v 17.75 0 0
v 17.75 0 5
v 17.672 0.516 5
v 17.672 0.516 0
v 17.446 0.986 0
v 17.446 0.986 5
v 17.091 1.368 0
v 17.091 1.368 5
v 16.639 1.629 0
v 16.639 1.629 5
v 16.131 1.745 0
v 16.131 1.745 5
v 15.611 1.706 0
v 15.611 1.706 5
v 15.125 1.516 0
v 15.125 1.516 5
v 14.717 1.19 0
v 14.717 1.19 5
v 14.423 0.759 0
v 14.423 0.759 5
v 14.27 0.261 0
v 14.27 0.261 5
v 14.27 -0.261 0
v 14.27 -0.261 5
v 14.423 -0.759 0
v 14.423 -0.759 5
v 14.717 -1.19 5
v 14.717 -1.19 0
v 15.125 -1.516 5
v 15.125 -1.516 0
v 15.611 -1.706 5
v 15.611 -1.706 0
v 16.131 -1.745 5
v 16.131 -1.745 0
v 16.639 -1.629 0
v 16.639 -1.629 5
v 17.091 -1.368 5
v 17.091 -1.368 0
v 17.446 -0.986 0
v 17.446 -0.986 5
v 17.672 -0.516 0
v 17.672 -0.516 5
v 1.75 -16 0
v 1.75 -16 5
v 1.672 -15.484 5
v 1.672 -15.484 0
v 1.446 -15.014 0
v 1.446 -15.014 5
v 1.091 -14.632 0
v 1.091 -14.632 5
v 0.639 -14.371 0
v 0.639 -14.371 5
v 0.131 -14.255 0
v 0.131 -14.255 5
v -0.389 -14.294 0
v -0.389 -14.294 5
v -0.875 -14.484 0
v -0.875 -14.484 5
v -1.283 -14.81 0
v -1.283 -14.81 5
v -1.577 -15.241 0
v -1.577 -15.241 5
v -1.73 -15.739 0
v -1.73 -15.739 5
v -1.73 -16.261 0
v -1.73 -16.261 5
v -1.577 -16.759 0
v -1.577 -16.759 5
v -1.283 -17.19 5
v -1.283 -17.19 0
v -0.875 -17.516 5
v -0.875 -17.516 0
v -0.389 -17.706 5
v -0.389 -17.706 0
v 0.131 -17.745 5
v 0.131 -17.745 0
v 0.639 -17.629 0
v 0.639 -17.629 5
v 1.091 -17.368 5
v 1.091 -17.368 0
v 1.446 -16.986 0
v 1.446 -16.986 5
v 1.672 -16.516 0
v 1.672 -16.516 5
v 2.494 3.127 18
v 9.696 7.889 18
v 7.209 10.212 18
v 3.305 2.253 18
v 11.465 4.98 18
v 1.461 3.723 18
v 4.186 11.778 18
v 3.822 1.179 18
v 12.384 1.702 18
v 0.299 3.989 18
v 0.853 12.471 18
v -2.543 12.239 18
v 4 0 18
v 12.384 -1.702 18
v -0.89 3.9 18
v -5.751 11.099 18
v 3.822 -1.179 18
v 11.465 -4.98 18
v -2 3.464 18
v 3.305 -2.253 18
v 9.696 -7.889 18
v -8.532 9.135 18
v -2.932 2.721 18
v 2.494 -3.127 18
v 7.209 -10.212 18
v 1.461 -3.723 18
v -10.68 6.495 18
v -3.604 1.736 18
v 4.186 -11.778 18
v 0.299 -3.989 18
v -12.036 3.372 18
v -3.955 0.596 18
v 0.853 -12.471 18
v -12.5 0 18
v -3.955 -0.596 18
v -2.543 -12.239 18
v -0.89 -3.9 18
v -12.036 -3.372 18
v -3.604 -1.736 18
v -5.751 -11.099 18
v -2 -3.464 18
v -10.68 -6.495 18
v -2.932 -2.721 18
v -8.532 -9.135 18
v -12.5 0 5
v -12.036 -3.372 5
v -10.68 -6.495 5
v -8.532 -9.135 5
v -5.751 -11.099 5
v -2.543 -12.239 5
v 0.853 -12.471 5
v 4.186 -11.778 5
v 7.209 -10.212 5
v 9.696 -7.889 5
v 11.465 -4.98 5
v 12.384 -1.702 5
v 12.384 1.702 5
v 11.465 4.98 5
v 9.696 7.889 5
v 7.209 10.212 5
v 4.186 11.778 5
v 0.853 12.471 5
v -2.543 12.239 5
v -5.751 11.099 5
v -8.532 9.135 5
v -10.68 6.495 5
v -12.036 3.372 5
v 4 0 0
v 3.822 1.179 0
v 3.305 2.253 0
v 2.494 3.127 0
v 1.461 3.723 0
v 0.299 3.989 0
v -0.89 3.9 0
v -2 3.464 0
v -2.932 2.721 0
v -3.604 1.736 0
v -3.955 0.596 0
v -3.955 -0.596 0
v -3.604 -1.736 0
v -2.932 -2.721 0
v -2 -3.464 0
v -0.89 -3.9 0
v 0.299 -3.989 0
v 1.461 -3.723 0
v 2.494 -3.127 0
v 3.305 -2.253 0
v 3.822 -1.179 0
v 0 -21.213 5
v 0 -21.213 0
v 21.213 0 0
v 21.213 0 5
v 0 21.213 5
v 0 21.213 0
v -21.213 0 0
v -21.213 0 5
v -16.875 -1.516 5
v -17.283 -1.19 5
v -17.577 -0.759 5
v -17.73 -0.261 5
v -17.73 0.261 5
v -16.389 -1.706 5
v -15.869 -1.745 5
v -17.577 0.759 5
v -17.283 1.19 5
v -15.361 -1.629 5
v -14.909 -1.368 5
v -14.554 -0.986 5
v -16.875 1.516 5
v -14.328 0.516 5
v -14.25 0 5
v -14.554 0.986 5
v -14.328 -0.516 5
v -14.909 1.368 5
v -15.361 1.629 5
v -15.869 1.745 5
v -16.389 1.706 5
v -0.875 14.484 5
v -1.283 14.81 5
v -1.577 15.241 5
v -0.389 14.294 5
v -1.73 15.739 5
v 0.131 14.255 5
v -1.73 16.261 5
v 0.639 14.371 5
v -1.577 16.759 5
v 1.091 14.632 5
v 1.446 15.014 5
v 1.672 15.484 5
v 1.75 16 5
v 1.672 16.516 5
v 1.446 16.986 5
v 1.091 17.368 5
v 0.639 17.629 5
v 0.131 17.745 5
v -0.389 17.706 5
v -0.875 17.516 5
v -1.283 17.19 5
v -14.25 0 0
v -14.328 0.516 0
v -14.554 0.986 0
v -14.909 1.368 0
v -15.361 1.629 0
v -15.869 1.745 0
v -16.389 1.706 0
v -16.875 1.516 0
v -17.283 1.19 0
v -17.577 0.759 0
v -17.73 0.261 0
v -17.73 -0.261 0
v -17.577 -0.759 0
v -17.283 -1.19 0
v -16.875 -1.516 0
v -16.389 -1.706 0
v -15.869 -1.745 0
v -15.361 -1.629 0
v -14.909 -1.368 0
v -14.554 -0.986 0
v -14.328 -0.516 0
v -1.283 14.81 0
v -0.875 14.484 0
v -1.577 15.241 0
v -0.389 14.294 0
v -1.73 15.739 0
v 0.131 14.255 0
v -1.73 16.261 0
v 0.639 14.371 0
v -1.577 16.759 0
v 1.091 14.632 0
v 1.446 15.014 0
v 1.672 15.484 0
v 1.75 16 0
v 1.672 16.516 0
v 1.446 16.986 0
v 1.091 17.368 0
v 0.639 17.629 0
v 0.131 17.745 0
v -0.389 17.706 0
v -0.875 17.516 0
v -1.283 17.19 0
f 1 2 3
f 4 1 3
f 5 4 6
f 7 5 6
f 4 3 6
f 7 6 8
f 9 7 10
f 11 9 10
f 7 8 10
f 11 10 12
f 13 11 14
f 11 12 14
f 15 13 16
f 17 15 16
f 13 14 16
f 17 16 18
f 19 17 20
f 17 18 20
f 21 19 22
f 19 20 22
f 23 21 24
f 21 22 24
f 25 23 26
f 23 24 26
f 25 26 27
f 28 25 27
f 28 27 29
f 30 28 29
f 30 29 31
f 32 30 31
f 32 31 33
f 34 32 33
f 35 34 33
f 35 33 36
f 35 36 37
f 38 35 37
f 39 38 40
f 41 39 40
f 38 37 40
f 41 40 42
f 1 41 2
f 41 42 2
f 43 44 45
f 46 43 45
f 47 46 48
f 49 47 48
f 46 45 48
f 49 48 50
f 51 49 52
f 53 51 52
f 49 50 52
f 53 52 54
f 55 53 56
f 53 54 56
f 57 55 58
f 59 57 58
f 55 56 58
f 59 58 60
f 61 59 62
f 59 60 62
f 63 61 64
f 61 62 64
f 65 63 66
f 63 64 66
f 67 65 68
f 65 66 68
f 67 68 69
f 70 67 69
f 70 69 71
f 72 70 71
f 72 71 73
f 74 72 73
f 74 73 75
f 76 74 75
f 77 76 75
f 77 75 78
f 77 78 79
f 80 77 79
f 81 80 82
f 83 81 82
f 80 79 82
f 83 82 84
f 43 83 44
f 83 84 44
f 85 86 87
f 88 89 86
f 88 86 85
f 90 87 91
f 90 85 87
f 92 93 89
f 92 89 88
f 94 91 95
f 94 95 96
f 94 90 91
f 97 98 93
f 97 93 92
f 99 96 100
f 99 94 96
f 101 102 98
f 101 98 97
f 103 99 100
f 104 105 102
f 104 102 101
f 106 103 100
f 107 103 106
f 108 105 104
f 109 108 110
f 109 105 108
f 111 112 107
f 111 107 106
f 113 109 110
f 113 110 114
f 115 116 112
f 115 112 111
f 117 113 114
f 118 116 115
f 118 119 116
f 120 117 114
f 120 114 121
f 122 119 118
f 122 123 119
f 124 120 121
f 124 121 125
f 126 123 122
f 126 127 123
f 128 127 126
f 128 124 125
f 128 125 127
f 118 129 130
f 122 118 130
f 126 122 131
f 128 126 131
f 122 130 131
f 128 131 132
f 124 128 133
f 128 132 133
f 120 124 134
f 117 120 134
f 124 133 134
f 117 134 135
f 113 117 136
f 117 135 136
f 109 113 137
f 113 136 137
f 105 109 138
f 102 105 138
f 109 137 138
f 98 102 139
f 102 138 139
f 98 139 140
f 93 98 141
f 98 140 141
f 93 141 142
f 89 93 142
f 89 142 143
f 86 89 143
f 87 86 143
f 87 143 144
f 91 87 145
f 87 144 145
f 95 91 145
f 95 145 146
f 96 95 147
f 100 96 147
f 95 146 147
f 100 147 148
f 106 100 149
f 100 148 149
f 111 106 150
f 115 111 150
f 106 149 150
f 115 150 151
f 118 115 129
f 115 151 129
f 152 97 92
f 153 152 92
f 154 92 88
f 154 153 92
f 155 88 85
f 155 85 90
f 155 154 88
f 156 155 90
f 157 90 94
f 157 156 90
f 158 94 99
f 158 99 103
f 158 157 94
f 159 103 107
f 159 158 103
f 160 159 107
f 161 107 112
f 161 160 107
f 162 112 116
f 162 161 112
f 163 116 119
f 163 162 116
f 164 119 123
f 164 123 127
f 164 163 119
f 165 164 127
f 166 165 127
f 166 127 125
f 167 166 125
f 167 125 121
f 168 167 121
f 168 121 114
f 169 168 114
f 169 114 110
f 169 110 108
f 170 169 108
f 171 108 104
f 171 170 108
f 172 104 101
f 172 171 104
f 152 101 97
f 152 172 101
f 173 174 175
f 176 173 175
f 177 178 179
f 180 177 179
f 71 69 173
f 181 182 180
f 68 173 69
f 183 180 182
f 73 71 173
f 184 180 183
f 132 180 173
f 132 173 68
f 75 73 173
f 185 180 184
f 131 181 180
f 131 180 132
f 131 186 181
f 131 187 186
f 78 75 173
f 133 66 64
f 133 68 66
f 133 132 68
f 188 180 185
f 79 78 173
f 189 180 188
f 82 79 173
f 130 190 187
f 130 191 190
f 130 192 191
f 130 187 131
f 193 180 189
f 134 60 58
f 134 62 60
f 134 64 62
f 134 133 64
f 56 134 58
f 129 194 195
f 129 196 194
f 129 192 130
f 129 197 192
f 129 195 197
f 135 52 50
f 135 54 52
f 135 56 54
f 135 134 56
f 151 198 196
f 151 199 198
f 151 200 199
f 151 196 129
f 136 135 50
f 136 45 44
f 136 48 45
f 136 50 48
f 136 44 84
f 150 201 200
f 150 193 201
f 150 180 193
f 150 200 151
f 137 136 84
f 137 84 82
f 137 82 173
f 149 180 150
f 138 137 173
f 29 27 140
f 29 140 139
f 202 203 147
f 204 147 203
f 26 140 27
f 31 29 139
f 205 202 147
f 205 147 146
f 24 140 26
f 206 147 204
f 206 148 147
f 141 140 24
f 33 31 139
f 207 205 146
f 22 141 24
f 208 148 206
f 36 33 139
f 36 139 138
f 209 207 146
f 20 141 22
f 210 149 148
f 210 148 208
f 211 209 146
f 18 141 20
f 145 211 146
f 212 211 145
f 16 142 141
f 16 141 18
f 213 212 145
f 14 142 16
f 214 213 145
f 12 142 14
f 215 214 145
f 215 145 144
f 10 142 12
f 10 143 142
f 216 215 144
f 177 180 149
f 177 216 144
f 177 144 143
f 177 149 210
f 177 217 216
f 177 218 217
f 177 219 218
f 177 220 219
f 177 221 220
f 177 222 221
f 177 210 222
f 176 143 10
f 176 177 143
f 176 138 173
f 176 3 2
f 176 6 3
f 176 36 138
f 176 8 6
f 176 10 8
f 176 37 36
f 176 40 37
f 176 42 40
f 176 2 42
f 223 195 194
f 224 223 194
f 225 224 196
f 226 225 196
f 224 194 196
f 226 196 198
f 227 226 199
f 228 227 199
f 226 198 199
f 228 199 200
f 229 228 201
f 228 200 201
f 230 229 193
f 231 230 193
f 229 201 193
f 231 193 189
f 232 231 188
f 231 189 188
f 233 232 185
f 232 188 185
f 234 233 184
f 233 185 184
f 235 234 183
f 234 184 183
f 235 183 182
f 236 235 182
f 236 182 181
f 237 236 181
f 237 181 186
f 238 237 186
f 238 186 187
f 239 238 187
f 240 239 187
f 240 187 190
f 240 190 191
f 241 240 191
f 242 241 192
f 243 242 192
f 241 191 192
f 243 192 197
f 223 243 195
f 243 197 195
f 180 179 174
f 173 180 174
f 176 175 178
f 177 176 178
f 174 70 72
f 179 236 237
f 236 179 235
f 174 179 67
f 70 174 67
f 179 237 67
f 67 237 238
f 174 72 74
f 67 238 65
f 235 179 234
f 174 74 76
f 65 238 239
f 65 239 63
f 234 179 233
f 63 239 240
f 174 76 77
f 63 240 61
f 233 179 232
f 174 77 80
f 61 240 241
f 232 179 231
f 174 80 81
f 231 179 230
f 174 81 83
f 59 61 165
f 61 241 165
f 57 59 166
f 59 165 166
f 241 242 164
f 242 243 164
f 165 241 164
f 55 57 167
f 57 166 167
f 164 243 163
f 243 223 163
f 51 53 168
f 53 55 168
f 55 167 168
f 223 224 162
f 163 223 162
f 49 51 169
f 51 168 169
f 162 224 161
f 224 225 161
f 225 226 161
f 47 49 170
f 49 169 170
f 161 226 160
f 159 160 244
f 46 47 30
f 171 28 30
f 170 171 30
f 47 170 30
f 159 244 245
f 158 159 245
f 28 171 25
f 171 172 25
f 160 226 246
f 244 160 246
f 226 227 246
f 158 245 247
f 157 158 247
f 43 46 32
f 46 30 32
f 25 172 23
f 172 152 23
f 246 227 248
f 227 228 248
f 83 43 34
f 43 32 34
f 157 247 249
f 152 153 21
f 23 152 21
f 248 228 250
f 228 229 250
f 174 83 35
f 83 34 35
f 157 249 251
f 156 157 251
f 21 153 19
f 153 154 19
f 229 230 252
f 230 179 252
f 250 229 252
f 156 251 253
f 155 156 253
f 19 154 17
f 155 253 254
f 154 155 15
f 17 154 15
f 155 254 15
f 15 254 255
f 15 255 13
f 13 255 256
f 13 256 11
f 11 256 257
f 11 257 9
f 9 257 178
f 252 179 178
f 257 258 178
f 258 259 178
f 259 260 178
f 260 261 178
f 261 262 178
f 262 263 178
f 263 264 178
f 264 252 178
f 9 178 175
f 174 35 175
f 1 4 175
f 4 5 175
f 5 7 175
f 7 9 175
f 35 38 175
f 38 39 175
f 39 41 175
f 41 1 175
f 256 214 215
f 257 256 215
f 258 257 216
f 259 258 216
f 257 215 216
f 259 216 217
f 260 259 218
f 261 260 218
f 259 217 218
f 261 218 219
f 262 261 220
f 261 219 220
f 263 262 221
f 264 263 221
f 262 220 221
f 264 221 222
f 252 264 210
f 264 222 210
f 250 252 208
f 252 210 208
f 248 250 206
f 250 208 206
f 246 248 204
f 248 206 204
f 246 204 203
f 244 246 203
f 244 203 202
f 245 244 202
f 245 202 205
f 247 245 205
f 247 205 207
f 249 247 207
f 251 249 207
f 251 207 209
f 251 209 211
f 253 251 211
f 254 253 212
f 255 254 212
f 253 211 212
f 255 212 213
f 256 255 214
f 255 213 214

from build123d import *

# Parameters (mm, degrees)
SKETCH_1_R          = 4
EXTRUDE_1_DEPTH     = 5
SKETCH_2_R          = 1.75
CUT_EXTRUDE_1_DEPTH = 5
SKETCH_3_R          = 12.5
SKETCH_3_R_2        = 4
EXTRUDE_2_DEPTH     = 13


with BuildPart() as part:
    # 草图1 → 凸台-拉伸1 (new body)
    with BuildSketch(Plane.XY):
        Polygon((0, 21.213203436), (-21.213203436, 0), (0, -21.213203436), (21.213203436, 0), align=None)
        Circle(SKETCH_1_R, mode=Mode.SUBTRACT)
    extrude(amount=EXTRUDE_1_DEPTH)

    # 草图2 → 切除-拉伸1 (cut)
    with BuildSketch(Plane.XY.offset(5)):
        with Locations((16, 0)):
            Circle(SKETCH_2_R)
        with Locations((0, -16)):
            Circle(SKETCH_2_R)
        with Locations((-16, 0)):
            Circle(SKETCH_2_R)
        with Locations((0, 16)):
            Circle(SKETCH_2_R)
    extrude(amount=-CUT_EXTRUDE_1_DEPTH, mode=Mode.SUBTRACT)

    # 草图3 → 凸台-拉伸2 (add)
    with BuildSketch(Plane.XY.offset(5)):
        with Locations(Location((0, 0, 0), (0, 0, 180))):
            Circle(SKETCH_3_R)
        Circle(SKETCH_3_R_2, mode=Mode.SUBTRACT)
    extrude(amount=EXTRUDE_2_DEPTH)


solid = part.part
